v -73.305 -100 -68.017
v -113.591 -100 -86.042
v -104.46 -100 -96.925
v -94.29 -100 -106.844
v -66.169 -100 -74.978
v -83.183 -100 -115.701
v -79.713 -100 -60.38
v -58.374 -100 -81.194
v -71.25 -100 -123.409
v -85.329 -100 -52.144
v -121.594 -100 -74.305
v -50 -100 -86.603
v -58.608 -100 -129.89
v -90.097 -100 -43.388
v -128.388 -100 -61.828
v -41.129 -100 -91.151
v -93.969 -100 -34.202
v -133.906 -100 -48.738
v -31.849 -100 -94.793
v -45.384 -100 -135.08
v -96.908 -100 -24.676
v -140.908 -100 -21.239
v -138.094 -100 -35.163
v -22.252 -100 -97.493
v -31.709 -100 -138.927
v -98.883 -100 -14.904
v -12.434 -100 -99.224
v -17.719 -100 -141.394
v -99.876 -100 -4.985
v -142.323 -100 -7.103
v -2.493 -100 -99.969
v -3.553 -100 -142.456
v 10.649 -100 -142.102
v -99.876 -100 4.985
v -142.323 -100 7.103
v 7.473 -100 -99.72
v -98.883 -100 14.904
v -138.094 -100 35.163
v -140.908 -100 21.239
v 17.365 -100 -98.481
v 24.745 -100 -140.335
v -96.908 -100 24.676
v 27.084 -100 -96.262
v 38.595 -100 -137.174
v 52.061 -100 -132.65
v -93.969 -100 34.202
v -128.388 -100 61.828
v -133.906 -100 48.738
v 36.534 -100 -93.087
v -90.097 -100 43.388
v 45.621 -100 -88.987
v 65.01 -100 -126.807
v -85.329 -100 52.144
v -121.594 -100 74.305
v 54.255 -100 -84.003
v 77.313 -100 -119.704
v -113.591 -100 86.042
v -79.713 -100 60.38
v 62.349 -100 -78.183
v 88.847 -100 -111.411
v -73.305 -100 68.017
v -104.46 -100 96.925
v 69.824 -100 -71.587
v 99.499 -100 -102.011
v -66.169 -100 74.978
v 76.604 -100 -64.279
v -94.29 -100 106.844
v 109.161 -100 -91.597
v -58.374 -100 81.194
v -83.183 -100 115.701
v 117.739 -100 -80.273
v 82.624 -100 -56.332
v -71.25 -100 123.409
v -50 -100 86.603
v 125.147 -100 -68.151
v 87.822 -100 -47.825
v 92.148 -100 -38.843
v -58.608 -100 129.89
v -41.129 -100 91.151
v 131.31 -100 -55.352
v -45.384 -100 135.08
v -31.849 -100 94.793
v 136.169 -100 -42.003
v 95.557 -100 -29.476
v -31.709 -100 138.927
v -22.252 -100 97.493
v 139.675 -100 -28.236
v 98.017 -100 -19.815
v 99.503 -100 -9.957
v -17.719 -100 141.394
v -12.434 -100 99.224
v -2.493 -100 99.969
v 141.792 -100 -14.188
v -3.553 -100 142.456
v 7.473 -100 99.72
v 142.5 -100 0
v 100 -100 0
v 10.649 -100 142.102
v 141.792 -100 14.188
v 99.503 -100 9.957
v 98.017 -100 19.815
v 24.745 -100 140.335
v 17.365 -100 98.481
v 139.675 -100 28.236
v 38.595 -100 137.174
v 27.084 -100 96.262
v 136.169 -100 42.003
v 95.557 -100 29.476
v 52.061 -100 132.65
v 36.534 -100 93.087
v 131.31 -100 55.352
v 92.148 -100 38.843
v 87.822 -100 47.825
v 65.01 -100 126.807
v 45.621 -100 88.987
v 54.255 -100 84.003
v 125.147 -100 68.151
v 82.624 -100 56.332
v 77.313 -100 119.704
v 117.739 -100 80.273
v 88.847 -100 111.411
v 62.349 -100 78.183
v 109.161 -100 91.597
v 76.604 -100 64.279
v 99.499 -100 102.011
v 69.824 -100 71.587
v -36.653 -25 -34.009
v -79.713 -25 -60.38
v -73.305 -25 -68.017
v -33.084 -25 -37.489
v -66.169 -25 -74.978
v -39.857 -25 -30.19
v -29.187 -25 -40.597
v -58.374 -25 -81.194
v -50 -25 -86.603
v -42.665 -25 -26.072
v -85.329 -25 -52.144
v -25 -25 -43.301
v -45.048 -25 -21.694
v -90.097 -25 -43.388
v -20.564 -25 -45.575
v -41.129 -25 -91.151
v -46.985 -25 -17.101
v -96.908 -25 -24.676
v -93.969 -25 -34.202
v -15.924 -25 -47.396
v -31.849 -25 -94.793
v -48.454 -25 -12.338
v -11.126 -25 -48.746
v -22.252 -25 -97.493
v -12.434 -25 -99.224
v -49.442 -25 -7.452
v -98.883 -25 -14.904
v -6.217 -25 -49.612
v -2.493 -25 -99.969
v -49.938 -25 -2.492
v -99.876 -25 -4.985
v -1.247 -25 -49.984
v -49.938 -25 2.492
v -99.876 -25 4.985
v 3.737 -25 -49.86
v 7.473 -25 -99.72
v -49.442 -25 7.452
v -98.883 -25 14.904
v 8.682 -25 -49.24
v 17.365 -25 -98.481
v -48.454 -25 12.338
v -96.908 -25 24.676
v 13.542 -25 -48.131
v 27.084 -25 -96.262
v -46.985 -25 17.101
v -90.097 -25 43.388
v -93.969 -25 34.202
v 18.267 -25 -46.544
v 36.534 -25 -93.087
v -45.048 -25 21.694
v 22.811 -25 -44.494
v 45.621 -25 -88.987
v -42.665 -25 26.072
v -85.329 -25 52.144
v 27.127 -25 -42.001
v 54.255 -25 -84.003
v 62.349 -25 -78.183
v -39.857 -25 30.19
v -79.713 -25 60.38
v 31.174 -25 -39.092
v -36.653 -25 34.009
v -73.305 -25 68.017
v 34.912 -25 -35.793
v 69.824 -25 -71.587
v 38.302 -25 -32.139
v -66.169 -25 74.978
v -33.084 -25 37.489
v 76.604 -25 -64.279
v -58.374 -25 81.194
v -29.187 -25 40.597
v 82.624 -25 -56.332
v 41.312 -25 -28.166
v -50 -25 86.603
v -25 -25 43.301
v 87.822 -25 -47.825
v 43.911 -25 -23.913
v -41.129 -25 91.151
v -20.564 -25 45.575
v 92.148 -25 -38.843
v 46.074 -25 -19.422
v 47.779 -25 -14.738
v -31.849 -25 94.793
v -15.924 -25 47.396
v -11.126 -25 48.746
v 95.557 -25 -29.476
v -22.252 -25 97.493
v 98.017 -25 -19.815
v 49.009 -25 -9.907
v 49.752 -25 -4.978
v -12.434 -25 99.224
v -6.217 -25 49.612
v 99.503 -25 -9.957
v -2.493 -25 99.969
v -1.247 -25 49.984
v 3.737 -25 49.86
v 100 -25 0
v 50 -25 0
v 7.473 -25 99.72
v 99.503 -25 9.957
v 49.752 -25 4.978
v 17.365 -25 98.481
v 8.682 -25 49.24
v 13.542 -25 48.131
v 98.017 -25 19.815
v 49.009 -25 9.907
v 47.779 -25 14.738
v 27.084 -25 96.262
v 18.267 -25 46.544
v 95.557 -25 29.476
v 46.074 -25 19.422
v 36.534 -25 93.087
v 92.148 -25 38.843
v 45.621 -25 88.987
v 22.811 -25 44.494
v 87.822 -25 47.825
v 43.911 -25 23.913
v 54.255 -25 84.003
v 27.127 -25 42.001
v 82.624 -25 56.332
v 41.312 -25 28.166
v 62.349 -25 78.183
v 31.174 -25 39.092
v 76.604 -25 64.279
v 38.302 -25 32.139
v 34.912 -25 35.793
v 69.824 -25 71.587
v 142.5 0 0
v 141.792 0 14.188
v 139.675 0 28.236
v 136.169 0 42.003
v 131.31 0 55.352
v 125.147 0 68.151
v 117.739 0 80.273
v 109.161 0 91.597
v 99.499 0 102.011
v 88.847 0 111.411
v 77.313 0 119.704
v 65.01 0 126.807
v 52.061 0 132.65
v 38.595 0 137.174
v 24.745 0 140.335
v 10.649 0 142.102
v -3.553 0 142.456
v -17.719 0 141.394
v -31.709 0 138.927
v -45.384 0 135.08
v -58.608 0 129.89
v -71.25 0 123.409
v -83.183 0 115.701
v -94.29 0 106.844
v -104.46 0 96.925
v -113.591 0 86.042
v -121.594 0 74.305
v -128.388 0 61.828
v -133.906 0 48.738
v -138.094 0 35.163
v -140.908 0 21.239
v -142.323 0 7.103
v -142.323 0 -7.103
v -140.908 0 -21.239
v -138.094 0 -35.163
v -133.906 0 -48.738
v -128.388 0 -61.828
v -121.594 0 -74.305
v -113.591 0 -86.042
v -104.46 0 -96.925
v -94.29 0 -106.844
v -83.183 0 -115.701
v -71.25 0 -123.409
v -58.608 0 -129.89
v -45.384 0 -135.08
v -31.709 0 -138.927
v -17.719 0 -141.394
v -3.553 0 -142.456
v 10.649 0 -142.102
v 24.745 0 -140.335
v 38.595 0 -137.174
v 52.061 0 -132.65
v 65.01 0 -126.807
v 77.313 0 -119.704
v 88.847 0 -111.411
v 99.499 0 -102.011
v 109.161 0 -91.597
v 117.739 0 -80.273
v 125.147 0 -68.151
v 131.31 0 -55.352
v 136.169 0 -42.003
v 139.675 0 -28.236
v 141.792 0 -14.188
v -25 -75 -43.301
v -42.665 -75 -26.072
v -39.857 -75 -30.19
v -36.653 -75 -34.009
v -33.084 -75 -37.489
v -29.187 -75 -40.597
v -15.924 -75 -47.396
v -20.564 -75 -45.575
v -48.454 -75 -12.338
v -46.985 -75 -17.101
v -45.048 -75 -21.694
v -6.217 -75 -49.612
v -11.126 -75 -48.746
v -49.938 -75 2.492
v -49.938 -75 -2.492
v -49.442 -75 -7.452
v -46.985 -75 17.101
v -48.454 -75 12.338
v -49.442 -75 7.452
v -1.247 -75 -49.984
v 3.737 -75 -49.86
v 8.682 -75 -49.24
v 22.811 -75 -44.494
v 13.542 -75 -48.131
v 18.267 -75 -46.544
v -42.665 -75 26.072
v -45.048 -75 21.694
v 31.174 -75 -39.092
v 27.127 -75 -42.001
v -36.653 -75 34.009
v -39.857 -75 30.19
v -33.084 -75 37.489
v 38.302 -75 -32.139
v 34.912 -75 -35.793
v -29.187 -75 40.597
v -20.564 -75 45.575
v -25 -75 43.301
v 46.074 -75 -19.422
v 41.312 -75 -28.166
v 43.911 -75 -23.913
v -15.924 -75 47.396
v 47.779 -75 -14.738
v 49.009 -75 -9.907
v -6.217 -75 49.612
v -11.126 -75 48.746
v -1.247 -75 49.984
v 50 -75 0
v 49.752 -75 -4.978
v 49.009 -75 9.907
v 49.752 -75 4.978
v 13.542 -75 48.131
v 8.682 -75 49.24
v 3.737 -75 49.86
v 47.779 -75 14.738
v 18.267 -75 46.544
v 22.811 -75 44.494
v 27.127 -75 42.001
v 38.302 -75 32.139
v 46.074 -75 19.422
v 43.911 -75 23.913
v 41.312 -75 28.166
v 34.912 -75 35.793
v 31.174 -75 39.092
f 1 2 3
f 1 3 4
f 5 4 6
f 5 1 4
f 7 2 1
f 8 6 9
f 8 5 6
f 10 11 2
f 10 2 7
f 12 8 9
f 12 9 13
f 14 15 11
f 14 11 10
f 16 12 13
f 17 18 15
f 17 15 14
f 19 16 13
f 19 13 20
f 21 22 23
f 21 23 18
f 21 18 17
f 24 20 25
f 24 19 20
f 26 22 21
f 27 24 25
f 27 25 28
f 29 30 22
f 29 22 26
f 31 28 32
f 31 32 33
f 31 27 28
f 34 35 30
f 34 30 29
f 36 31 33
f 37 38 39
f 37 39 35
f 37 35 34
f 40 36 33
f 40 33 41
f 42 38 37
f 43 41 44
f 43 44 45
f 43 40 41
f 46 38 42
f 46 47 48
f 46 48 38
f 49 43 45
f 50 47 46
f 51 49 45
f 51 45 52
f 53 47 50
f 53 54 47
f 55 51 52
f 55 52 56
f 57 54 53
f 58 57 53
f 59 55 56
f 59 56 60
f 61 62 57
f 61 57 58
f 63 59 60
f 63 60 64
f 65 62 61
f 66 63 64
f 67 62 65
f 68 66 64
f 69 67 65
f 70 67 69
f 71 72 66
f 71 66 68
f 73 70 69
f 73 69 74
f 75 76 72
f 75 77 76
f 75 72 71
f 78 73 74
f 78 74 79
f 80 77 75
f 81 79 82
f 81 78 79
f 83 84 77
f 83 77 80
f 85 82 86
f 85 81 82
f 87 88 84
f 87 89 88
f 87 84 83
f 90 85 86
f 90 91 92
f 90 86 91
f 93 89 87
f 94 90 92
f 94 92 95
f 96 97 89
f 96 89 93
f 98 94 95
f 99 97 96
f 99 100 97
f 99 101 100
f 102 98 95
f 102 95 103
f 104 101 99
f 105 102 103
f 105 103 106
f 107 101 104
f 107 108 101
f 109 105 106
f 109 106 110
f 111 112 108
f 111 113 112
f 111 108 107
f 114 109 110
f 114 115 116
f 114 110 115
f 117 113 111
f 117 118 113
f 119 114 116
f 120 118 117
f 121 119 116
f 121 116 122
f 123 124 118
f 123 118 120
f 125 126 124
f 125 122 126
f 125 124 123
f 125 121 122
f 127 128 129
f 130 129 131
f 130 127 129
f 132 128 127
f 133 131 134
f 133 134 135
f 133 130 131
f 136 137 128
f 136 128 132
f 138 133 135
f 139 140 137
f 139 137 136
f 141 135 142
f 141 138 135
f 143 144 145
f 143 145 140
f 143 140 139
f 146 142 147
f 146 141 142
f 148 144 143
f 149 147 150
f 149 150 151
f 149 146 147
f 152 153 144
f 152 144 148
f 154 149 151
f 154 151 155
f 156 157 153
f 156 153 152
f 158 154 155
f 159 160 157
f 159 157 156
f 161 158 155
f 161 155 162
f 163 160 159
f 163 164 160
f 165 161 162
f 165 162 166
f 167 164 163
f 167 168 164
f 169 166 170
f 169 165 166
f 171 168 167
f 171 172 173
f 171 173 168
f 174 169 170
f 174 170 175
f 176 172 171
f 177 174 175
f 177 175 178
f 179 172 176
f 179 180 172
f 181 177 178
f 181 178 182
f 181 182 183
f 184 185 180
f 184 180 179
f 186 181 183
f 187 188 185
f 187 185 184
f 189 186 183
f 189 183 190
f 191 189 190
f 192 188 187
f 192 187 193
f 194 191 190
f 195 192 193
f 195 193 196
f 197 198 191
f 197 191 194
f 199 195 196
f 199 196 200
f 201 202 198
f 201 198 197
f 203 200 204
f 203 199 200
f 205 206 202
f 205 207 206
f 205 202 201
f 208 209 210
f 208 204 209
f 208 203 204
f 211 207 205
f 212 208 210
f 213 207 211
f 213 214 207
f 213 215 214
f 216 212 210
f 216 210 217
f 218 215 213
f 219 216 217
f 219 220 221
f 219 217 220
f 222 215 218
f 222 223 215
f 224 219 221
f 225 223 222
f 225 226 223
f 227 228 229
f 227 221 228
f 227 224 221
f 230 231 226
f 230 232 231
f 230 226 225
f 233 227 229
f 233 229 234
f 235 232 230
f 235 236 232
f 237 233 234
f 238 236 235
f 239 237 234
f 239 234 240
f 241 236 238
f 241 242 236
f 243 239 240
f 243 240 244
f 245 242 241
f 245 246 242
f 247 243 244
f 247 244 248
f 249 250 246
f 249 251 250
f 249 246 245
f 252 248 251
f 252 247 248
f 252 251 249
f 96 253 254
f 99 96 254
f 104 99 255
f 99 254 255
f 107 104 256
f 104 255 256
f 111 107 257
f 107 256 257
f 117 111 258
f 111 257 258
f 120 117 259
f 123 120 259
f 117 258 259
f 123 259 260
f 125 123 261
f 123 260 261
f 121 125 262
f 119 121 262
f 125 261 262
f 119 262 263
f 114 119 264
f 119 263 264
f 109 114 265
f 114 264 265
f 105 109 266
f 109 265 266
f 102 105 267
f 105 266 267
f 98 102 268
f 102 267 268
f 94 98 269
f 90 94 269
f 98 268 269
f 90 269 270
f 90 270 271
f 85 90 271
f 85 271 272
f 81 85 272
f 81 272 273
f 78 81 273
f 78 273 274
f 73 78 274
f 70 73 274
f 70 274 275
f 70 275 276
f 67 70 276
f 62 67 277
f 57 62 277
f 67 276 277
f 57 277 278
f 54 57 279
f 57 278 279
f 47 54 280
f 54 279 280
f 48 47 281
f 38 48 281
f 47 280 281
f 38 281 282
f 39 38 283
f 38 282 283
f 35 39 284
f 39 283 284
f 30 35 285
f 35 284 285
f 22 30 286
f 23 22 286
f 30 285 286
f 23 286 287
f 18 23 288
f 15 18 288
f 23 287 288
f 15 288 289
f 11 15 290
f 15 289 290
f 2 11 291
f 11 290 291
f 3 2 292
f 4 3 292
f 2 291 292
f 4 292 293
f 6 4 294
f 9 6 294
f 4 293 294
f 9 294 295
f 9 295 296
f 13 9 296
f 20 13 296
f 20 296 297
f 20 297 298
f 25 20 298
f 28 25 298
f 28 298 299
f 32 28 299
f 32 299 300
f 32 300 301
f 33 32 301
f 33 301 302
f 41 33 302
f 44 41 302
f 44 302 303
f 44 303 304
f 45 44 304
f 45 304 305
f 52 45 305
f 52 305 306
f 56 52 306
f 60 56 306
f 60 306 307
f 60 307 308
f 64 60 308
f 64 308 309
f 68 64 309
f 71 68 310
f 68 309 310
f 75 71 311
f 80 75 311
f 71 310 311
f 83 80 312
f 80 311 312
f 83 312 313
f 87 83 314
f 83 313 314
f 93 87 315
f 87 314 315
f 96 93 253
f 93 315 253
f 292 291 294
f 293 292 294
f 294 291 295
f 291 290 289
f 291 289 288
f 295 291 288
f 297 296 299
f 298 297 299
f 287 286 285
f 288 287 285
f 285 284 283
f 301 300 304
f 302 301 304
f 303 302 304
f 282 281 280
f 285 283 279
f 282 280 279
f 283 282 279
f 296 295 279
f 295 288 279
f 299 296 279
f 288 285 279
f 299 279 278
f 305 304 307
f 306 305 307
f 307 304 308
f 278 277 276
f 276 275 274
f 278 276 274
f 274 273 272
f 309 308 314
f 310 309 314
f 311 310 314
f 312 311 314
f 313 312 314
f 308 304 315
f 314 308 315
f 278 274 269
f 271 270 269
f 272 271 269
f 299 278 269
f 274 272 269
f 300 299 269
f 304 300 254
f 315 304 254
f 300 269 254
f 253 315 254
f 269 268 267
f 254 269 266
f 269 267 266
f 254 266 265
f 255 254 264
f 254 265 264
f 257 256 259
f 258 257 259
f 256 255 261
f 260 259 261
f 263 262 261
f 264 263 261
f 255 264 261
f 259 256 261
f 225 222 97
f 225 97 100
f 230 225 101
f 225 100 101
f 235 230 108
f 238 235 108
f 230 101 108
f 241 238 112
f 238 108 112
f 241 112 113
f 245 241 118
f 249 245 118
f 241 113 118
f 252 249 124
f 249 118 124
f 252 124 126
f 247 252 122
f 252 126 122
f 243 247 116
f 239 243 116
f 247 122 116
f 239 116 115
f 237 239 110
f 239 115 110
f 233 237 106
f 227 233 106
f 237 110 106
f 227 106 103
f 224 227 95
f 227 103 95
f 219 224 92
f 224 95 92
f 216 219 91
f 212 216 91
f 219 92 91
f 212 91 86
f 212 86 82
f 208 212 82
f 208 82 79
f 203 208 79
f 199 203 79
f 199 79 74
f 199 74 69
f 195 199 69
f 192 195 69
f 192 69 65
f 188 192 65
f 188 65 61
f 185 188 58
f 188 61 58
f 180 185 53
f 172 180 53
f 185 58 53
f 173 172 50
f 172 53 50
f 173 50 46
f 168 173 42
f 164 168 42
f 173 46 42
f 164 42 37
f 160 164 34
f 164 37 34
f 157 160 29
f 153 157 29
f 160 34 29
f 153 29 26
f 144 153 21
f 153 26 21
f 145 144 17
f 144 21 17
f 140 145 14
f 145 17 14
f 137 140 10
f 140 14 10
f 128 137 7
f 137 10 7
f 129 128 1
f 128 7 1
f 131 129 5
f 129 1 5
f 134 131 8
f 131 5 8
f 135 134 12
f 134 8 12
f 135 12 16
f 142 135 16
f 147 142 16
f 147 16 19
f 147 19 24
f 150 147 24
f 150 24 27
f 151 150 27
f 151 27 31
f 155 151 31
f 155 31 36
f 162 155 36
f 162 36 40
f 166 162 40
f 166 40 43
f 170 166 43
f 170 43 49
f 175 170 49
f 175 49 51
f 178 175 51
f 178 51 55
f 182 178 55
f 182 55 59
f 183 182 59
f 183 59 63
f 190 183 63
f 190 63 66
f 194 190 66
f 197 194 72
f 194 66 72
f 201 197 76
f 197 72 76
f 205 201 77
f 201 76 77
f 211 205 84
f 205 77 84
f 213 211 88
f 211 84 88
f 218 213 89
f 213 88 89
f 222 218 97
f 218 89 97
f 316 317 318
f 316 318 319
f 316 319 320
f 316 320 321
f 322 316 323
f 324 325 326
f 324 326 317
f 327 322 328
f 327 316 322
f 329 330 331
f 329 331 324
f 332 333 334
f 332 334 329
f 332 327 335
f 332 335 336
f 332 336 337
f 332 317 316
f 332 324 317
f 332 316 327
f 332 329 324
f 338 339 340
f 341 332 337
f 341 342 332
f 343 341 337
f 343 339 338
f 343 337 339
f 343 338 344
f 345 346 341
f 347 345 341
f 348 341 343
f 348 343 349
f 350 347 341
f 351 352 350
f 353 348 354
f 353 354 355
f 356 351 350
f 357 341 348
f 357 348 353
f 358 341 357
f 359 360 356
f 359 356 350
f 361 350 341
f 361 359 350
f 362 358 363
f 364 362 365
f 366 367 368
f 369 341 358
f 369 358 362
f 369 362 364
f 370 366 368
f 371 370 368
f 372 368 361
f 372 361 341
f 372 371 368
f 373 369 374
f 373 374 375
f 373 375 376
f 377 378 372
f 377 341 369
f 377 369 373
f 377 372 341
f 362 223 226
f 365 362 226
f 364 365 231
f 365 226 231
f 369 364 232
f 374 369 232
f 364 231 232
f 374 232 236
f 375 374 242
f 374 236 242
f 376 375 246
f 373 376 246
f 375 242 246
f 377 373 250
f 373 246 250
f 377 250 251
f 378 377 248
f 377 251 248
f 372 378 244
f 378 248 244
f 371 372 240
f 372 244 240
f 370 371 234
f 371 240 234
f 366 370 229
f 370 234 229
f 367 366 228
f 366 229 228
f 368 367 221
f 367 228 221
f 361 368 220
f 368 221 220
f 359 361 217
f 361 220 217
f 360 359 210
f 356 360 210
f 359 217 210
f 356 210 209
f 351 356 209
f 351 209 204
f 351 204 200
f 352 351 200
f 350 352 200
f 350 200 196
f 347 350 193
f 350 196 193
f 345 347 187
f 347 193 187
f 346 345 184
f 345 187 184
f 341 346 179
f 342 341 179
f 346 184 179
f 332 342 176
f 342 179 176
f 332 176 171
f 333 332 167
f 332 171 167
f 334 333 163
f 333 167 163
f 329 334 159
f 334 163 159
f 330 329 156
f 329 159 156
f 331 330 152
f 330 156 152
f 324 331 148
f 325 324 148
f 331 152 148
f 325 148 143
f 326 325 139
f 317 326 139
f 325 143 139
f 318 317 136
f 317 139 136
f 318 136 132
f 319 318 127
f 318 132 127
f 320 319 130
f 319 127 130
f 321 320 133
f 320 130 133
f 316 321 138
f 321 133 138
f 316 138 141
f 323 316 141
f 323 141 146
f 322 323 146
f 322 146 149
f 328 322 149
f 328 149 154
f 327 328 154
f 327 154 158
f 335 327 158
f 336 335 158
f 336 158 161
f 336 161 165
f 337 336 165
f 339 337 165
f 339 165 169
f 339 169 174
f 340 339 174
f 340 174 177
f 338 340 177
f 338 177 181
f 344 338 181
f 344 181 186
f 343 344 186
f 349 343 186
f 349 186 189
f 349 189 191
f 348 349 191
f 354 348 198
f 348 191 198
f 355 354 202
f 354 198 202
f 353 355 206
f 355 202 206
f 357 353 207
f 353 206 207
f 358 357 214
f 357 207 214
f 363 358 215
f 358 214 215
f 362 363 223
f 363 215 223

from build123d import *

# Parameters (mm, degrees)
F0_R     = 142.5
F1_DEPTH = 100
F2_R     = 100
F3_DEPTH = 75
F4_R     = 50
F5_DEPTH = 50


with BuildPart() as f1:
    # F0 (on Front) → F1 (new body)
    with BuildSketch(Plane.XZ):
        Circle(F0_R)
    extrude(amount=F1_DEPTH)

    # F2 (on face) → F3 (cut)
    with BuildSketch(Plane.XZ.offset(100)):
        Circle(F2_R)
    extrude(amount=-F3_DEPTH, mode=Mode.SUBTRACT)

    # F4 (on face) → F5 (join)
    with BuildSketch(Plane.XZ.offset(25)):
        Circle(F4_R)
    extrude(amount=F5_DEPTH)


solid = f1.part
